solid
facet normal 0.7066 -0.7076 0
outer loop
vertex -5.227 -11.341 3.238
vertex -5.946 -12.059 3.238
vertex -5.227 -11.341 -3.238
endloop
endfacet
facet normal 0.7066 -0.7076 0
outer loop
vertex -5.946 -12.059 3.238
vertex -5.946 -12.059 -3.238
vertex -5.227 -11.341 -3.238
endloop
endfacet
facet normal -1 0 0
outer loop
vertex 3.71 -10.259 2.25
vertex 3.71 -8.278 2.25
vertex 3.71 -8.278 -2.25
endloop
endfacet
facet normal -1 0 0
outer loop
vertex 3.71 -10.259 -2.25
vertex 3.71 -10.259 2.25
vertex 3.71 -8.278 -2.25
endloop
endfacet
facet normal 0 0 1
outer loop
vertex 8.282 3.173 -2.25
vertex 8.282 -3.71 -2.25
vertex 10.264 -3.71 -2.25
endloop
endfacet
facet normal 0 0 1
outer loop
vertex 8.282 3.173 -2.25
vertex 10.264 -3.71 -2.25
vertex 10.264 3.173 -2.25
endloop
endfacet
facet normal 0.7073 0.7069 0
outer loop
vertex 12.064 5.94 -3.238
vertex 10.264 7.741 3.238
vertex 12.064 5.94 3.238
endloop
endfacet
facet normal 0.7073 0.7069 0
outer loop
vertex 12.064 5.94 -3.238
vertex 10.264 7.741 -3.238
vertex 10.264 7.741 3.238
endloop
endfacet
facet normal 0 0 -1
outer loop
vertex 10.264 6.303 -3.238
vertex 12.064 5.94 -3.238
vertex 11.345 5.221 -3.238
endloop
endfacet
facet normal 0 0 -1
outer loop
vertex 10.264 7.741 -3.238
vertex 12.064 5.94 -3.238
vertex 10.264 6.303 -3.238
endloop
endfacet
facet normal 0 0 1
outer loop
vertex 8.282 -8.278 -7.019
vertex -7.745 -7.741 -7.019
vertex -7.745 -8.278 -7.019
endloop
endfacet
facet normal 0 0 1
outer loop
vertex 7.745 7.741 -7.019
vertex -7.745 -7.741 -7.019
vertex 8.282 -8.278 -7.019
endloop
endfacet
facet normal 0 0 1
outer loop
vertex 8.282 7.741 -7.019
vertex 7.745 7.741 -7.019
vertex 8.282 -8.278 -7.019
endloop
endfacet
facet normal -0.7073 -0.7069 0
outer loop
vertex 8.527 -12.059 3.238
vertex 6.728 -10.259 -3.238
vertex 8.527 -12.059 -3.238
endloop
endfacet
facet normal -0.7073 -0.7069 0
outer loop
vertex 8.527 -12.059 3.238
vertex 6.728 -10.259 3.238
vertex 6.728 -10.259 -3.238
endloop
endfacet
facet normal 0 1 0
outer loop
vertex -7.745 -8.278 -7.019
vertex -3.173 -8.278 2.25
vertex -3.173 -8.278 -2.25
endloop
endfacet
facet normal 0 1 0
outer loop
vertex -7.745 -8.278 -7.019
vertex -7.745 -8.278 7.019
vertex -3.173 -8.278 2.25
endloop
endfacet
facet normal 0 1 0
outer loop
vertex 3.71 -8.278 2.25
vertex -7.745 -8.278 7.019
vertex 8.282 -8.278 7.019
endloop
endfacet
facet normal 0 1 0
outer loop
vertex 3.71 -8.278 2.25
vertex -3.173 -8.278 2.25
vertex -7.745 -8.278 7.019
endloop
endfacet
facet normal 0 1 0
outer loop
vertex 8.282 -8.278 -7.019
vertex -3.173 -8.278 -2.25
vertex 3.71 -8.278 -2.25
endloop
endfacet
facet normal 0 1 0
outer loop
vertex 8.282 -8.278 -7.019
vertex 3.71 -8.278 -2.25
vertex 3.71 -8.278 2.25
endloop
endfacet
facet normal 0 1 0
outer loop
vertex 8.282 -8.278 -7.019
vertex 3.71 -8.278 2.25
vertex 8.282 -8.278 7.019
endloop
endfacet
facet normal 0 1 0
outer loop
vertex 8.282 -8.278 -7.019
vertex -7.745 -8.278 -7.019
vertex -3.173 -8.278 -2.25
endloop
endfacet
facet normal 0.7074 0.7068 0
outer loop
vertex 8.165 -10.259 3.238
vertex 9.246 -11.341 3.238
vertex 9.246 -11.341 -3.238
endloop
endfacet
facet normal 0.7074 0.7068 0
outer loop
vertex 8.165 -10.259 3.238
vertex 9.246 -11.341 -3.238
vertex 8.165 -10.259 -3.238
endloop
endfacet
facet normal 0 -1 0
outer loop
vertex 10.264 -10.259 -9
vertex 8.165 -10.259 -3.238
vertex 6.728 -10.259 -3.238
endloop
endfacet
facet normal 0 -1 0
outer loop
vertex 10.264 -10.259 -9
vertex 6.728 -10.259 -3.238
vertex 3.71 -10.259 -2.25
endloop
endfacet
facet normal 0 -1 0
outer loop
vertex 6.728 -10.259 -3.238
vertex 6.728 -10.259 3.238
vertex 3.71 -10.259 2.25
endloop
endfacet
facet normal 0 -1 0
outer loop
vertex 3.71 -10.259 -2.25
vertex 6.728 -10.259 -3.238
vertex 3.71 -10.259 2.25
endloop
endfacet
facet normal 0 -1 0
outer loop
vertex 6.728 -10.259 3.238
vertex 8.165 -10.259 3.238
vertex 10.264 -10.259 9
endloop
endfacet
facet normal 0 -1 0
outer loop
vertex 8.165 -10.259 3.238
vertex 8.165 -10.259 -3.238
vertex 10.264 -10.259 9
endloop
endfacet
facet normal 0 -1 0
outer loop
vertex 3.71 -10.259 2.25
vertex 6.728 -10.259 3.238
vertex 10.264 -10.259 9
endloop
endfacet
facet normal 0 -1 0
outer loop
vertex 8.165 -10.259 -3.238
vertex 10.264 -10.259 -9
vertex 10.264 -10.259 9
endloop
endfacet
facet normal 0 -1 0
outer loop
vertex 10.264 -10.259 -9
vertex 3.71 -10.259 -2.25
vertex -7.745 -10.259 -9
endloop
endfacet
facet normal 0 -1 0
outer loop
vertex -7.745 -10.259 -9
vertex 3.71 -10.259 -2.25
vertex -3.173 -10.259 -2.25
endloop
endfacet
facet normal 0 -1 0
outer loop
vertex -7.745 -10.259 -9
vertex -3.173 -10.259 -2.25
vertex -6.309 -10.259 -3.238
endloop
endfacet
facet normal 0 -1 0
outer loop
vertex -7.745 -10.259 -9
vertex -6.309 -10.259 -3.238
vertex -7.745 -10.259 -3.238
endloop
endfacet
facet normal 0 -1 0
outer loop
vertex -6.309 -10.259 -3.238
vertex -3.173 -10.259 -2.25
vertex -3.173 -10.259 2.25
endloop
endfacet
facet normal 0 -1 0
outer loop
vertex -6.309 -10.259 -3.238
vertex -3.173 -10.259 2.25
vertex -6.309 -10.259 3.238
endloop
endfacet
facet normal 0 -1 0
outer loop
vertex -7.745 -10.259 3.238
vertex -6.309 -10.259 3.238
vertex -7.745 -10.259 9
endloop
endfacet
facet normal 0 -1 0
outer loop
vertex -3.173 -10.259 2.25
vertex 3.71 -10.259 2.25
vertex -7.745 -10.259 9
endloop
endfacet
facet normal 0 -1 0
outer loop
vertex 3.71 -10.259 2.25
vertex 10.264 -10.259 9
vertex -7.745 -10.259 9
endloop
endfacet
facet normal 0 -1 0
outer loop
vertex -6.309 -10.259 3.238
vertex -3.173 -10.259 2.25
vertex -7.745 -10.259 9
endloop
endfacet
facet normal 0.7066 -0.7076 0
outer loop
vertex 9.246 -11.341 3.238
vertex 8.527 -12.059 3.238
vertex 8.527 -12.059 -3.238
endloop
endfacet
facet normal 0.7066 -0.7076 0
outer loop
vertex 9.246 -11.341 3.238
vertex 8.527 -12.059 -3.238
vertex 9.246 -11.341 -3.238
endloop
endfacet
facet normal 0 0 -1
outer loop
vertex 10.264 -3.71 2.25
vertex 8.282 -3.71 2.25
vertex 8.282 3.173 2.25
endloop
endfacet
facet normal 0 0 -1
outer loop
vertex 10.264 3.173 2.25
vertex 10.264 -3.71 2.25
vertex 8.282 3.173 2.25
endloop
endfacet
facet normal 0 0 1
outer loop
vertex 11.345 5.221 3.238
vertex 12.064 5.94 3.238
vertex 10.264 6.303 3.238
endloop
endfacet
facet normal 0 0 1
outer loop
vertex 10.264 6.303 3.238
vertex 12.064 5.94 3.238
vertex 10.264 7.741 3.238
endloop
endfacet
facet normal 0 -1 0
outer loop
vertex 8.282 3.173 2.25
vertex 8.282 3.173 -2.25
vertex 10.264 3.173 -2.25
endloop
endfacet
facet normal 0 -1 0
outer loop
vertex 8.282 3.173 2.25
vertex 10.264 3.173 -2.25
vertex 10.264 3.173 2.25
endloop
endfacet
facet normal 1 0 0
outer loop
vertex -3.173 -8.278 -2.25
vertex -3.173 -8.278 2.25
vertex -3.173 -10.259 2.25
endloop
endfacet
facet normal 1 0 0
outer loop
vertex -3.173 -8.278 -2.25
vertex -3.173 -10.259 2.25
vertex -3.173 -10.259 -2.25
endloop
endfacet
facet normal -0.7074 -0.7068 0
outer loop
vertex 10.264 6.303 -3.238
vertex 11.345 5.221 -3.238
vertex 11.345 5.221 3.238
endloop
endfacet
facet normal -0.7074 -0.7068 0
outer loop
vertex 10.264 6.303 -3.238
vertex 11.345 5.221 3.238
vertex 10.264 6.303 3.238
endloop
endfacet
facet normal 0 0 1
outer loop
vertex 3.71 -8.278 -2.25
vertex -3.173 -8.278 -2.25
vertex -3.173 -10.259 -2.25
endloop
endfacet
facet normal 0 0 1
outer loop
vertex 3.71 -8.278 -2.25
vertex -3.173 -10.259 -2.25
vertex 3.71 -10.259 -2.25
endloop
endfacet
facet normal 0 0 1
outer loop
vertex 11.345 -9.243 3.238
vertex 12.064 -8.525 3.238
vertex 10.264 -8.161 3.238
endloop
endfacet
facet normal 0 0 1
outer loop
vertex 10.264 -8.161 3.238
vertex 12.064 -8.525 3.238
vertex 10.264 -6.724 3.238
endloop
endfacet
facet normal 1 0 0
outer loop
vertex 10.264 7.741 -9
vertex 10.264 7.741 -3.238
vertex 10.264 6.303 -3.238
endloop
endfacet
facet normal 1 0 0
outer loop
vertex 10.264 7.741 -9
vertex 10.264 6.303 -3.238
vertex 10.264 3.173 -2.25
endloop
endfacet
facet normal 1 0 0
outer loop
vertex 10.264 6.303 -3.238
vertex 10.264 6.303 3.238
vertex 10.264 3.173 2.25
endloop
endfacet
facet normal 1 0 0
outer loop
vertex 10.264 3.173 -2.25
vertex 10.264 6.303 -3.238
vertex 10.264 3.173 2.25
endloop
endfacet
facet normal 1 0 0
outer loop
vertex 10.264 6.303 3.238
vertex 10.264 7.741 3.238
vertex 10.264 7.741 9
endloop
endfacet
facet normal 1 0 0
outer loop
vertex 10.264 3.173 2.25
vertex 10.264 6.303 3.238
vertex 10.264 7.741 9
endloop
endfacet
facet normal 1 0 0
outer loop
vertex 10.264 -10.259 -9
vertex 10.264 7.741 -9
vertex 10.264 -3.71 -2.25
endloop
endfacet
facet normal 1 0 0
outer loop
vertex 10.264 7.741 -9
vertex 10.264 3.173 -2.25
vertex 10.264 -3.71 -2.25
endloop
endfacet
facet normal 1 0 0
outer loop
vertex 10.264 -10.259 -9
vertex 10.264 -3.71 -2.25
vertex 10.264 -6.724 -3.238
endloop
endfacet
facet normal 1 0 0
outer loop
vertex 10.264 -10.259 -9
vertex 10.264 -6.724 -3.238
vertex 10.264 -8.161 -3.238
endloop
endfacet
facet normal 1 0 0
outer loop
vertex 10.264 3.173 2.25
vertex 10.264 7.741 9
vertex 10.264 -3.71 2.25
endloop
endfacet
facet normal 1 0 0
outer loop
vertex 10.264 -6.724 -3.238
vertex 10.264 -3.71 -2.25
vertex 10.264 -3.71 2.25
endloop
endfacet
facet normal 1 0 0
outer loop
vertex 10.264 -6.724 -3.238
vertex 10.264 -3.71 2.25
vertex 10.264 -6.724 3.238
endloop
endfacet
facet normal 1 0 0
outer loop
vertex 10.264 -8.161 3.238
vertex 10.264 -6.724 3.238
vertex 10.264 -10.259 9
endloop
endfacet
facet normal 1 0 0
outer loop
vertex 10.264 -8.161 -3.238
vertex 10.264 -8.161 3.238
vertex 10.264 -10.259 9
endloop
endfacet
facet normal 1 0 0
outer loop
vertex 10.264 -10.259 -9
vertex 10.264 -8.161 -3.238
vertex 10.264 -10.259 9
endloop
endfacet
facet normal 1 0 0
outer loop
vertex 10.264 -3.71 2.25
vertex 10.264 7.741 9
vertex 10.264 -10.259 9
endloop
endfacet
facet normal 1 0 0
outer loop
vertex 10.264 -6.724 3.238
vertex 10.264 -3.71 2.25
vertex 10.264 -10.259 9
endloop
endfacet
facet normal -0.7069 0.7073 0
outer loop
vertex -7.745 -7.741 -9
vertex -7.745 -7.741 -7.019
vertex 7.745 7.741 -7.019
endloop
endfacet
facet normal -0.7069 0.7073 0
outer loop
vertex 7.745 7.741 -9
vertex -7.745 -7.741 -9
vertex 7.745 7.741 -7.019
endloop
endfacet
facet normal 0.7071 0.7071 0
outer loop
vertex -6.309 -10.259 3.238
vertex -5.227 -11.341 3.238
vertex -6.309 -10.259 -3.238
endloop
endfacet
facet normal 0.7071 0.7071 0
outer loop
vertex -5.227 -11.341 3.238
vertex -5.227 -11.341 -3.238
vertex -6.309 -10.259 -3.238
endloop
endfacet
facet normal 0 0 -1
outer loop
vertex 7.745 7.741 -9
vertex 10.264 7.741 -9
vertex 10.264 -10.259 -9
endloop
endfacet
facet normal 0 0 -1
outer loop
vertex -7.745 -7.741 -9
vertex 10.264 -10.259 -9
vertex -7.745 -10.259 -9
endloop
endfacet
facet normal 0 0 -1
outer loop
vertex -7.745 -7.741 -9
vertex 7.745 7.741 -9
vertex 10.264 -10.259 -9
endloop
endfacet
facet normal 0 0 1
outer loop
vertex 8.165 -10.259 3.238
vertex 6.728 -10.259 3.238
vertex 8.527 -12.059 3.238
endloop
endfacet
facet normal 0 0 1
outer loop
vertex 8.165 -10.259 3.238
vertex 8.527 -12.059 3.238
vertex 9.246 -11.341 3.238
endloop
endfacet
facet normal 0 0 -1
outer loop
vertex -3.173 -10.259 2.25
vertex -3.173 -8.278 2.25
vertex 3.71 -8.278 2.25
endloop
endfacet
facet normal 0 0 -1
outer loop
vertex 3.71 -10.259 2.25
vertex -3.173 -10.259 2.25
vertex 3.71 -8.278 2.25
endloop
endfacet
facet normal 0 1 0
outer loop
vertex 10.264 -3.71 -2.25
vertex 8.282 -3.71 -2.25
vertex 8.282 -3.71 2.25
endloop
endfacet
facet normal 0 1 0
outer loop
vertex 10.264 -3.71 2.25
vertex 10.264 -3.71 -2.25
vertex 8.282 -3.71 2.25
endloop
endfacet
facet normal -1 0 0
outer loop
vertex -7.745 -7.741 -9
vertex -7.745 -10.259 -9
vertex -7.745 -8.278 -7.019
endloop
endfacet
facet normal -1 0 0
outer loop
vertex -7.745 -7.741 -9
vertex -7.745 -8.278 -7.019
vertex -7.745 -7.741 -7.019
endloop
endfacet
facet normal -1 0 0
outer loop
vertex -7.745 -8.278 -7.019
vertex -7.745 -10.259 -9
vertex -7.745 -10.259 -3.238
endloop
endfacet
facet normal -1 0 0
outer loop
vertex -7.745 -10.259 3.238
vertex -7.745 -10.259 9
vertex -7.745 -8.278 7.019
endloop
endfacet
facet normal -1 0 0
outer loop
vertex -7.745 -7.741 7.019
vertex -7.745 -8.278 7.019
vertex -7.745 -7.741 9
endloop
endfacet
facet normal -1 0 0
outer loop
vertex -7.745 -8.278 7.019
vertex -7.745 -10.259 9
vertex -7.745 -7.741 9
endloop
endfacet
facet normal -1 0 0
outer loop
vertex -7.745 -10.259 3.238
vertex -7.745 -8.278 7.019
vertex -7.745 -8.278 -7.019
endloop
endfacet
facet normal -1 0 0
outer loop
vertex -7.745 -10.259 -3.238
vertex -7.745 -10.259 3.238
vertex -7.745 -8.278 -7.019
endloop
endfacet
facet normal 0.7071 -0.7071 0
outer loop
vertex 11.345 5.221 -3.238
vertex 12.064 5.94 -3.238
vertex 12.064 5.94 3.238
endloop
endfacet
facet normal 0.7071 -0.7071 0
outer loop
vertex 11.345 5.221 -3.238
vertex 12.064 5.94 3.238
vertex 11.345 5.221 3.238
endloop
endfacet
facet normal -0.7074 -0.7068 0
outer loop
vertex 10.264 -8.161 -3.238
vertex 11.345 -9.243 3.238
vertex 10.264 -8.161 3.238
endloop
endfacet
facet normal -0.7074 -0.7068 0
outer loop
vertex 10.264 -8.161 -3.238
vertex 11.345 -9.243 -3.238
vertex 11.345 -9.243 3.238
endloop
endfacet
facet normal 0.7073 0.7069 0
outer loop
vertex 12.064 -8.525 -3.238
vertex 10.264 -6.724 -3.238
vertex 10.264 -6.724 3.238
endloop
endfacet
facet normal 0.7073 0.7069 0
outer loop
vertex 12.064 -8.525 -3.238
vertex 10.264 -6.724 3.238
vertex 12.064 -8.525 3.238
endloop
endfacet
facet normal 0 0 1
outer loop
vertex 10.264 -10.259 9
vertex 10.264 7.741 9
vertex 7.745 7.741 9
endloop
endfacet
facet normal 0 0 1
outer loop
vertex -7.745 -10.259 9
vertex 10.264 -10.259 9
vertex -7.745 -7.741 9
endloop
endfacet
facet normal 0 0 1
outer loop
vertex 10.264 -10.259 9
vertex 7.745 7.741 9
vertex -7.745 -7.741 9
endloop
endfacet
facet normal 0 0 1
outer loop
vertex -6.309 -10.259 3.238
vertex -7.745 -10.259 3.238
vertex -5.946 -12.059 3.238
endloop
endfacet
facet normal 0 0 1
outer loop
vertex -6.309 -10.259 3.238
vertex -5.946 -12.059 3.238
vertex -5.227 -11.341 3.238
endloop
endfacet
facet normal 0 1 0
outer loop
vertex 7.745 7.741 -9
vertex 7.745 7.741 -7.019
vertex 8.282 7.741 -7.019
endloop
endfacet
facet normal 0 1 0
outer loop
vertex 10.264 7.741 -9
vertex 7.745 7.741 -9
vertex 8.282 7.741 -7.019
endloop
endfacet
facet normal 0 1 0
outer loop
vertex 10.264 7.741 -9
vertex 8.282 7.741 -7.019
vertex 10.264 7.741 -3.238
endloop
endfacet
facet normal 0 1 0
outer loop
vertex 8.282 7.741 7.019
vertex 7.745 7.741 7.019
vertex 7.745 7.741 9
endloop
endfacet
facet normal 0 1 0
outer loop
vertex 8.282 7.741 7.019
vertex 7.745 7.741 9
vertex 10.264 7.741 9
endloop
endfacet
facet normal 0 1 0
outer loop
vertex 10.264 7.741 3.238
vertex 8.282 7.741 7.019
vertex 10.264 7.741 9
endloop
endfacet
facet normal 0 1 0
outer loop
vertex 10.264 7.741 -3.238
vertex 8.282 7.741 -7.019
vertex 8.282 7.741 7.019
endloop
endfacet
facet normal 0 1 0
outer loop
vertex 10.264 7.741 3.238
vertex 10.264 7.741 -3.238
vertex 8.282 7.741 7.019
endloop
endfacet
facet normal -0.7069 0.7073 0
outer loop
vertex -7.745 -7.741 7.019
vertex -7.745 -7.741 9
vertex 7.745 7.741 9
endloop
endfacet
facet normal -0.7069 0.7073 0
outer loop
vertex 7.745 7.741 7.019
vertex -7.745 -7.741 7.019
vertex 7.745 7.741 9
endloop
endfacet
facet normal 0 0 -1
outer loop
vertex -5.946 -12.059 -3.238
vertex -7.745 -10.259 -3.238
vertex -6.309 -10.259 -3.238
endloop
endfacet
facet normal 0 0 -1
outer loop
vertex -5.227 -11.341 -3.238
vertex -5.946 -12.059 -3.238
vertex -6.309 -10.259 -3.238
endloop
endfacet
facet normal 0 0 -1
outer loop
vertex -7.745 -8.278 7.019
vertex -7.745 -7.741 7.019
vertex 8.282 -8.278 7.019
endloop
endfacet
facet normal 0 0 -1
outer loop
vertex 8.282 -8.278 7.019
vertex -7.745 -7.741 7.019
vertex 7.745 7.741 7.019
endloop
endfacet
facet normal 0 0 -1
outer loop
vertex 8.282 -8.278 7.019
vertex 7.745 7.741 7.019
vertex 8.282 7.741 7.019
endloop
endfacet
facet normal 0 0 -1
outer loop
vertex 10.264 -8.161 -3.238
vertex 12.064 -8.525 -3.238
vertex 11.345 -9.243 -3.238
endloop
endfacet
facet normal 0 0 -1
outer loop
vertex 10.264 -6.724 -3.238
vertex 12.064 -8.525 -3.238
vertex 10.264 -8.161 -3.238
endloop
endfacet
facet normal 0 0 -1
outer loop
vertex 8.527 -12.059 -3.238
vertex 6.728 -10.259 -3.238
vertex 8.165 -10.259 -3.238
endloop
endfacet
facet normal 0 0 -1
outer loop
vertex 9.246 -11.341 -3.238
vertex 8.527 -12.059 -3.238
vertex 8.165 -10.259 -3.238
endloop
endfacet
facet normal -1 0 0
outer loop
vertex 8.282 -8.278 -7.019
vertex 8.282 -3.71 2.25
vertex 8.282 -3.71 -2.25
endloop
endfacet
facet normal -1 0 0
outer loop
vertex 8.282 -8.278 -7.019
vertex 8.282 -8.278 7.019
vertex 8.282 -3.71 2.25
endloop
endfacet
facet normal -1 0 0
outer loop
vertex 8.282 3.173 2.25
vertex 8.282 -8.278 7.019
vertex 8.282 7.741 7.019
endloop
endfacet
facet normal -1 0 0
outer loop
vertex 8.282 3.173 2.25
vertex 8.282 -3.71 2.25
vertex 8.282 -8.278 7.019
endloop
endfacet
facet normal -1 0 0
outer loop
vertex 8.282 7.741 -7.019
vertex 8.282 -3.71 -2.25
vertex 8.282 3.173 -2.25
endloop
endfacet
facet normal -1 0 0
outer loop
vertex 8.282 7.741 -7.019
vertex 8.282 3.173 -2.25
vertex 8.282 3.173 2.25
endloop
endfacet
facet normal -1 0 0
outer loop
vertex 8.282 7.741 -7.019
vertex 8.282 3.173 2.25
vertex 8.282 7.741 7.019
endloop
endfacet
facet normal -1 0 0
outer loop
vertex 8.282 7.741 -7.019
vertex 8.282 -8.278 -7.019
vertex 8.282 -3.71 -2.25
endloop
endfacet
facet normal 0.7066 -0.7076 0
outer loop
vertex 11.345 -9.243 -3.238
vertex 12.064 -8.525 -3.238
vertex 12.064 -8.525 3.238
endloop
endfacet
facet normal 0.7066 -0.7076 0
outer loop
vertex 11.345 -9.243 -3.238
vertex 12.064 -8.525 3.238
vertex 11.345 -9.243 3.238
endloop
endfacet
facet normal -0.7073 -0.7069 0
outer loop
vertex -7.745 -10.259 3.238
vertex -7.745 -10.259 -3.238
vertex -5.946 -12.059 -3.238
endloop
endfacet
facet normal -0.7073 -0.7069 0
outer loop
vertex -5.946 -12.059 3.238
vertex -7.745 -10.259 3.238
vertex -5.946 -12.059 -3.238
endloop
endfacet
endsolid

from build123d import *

# Parameters (mm, degrees)
EXTRUDE1_DEPTH          = 9
CUT_EXTRUDE1_DEPTH      = 7.0188
CUT_EXTRUDE1_DEPTH_BACK = 7.0188
SKETCH2_W               = 16.0274
SKETCH2_H               = 16.0188
SKETCH3_W               = 6.8834
SKETCH3_H               = 4.5
CUT_EXTRUDE2_DEPTH      = 22.046236615
SKETCH4_W               = 4.5
SKETCH4_H               = 6.8834
CUT_EXTRUDE3_DEPTH      = 22.050687025
EXTRUDE2_DEPTH          = 3.2385


with BuildPart() as part:
    # Sketch1 → Extrude1 (new, symmetric)
    with BuildSketch(Plane.XY):
        Polygon((10.263631045, 7.740668955), (10.263631045, -10.259331045), (-7.744968955, -10.259331045), (-7.744968955, -7.740668955), (7.744968955, 7.740668955), align=None)
    extrude(amount=EXTRUDE1_DEPTH, both=True)

    # Sketch2 → Cut-Extrude1 (cut, two sides: drawn at the far end of the back side and taken through both)
    with BuildSketch(Plane.XY.offset(-CUT_EXTRUDE1_DEPTH_BACK)):
        with Locations((0.268731045, -0.268731045)):
            Rectangle(SKETCH2_W, SKETCH2_H)
    extrude(amount=CUT_EXTRUDE1_DEPTH + CUT_EXTRUDE1_DEPTH_BACK, mode=Mode.SUBTRACT)

    # Sketch3 → Cut-Extrude2 (cut, through all)
    with BuildSketch(Plane(origin=(0, -8.278131045, 0), x_dir=(1, 0, 0), z_dir=(0, 1, 0))):
        with Locations((0.268731045, 0)):
            Rectangle(SKETCH3_W, SKETCH3_H)
    extrude(amount=-CUT_EXTRUDE2_DEPTH, mode=Mode.SUBTRACT)

    # Sketch4 → Cut-Extrude3 (cut, through all)
    with BuildSketch(Plane.ZY.offset(-8.282431045)):
        with Locations((0, -0.268731045)):
            Rectangle(SKETCH4_W, SKETCH4_H)
    extrude(amount=-CUT_EXTRUDE3_DEPTH, mode=Mode.SUBTRACT)

    # Sketch5 → Extrude2 (add, symmetric)
    with BuildSketch(Plane.XY):
        Polygon((10.263631045, 7.740668955), (12.063631045, 5.939669042), (11.345011094, 5.221448069), (10.263631045, 6.303428833), align=None)
        Polygon((10.263631045, -8.161019219), (10.263631045, -6.723779096), (12.063631045, -8.52477901), (11.345011094, -9.242999983), align=None)
        Polygon((-7.744968955, -10.259331045), (-5.945968314, -12.059331045), (-5.227348363, -11.341110071), (-6.308526787, -10.259331045), align=None)
        Polygon((6.728114898, -10.259331045), (8.52711554, -12.059331045), (9.24573549, -11.341110071), (8.164557066, -10.259331045), align=None)
    extrude(amount=EXTRUDE2_DEPTH, both=True)


solid = part.part
